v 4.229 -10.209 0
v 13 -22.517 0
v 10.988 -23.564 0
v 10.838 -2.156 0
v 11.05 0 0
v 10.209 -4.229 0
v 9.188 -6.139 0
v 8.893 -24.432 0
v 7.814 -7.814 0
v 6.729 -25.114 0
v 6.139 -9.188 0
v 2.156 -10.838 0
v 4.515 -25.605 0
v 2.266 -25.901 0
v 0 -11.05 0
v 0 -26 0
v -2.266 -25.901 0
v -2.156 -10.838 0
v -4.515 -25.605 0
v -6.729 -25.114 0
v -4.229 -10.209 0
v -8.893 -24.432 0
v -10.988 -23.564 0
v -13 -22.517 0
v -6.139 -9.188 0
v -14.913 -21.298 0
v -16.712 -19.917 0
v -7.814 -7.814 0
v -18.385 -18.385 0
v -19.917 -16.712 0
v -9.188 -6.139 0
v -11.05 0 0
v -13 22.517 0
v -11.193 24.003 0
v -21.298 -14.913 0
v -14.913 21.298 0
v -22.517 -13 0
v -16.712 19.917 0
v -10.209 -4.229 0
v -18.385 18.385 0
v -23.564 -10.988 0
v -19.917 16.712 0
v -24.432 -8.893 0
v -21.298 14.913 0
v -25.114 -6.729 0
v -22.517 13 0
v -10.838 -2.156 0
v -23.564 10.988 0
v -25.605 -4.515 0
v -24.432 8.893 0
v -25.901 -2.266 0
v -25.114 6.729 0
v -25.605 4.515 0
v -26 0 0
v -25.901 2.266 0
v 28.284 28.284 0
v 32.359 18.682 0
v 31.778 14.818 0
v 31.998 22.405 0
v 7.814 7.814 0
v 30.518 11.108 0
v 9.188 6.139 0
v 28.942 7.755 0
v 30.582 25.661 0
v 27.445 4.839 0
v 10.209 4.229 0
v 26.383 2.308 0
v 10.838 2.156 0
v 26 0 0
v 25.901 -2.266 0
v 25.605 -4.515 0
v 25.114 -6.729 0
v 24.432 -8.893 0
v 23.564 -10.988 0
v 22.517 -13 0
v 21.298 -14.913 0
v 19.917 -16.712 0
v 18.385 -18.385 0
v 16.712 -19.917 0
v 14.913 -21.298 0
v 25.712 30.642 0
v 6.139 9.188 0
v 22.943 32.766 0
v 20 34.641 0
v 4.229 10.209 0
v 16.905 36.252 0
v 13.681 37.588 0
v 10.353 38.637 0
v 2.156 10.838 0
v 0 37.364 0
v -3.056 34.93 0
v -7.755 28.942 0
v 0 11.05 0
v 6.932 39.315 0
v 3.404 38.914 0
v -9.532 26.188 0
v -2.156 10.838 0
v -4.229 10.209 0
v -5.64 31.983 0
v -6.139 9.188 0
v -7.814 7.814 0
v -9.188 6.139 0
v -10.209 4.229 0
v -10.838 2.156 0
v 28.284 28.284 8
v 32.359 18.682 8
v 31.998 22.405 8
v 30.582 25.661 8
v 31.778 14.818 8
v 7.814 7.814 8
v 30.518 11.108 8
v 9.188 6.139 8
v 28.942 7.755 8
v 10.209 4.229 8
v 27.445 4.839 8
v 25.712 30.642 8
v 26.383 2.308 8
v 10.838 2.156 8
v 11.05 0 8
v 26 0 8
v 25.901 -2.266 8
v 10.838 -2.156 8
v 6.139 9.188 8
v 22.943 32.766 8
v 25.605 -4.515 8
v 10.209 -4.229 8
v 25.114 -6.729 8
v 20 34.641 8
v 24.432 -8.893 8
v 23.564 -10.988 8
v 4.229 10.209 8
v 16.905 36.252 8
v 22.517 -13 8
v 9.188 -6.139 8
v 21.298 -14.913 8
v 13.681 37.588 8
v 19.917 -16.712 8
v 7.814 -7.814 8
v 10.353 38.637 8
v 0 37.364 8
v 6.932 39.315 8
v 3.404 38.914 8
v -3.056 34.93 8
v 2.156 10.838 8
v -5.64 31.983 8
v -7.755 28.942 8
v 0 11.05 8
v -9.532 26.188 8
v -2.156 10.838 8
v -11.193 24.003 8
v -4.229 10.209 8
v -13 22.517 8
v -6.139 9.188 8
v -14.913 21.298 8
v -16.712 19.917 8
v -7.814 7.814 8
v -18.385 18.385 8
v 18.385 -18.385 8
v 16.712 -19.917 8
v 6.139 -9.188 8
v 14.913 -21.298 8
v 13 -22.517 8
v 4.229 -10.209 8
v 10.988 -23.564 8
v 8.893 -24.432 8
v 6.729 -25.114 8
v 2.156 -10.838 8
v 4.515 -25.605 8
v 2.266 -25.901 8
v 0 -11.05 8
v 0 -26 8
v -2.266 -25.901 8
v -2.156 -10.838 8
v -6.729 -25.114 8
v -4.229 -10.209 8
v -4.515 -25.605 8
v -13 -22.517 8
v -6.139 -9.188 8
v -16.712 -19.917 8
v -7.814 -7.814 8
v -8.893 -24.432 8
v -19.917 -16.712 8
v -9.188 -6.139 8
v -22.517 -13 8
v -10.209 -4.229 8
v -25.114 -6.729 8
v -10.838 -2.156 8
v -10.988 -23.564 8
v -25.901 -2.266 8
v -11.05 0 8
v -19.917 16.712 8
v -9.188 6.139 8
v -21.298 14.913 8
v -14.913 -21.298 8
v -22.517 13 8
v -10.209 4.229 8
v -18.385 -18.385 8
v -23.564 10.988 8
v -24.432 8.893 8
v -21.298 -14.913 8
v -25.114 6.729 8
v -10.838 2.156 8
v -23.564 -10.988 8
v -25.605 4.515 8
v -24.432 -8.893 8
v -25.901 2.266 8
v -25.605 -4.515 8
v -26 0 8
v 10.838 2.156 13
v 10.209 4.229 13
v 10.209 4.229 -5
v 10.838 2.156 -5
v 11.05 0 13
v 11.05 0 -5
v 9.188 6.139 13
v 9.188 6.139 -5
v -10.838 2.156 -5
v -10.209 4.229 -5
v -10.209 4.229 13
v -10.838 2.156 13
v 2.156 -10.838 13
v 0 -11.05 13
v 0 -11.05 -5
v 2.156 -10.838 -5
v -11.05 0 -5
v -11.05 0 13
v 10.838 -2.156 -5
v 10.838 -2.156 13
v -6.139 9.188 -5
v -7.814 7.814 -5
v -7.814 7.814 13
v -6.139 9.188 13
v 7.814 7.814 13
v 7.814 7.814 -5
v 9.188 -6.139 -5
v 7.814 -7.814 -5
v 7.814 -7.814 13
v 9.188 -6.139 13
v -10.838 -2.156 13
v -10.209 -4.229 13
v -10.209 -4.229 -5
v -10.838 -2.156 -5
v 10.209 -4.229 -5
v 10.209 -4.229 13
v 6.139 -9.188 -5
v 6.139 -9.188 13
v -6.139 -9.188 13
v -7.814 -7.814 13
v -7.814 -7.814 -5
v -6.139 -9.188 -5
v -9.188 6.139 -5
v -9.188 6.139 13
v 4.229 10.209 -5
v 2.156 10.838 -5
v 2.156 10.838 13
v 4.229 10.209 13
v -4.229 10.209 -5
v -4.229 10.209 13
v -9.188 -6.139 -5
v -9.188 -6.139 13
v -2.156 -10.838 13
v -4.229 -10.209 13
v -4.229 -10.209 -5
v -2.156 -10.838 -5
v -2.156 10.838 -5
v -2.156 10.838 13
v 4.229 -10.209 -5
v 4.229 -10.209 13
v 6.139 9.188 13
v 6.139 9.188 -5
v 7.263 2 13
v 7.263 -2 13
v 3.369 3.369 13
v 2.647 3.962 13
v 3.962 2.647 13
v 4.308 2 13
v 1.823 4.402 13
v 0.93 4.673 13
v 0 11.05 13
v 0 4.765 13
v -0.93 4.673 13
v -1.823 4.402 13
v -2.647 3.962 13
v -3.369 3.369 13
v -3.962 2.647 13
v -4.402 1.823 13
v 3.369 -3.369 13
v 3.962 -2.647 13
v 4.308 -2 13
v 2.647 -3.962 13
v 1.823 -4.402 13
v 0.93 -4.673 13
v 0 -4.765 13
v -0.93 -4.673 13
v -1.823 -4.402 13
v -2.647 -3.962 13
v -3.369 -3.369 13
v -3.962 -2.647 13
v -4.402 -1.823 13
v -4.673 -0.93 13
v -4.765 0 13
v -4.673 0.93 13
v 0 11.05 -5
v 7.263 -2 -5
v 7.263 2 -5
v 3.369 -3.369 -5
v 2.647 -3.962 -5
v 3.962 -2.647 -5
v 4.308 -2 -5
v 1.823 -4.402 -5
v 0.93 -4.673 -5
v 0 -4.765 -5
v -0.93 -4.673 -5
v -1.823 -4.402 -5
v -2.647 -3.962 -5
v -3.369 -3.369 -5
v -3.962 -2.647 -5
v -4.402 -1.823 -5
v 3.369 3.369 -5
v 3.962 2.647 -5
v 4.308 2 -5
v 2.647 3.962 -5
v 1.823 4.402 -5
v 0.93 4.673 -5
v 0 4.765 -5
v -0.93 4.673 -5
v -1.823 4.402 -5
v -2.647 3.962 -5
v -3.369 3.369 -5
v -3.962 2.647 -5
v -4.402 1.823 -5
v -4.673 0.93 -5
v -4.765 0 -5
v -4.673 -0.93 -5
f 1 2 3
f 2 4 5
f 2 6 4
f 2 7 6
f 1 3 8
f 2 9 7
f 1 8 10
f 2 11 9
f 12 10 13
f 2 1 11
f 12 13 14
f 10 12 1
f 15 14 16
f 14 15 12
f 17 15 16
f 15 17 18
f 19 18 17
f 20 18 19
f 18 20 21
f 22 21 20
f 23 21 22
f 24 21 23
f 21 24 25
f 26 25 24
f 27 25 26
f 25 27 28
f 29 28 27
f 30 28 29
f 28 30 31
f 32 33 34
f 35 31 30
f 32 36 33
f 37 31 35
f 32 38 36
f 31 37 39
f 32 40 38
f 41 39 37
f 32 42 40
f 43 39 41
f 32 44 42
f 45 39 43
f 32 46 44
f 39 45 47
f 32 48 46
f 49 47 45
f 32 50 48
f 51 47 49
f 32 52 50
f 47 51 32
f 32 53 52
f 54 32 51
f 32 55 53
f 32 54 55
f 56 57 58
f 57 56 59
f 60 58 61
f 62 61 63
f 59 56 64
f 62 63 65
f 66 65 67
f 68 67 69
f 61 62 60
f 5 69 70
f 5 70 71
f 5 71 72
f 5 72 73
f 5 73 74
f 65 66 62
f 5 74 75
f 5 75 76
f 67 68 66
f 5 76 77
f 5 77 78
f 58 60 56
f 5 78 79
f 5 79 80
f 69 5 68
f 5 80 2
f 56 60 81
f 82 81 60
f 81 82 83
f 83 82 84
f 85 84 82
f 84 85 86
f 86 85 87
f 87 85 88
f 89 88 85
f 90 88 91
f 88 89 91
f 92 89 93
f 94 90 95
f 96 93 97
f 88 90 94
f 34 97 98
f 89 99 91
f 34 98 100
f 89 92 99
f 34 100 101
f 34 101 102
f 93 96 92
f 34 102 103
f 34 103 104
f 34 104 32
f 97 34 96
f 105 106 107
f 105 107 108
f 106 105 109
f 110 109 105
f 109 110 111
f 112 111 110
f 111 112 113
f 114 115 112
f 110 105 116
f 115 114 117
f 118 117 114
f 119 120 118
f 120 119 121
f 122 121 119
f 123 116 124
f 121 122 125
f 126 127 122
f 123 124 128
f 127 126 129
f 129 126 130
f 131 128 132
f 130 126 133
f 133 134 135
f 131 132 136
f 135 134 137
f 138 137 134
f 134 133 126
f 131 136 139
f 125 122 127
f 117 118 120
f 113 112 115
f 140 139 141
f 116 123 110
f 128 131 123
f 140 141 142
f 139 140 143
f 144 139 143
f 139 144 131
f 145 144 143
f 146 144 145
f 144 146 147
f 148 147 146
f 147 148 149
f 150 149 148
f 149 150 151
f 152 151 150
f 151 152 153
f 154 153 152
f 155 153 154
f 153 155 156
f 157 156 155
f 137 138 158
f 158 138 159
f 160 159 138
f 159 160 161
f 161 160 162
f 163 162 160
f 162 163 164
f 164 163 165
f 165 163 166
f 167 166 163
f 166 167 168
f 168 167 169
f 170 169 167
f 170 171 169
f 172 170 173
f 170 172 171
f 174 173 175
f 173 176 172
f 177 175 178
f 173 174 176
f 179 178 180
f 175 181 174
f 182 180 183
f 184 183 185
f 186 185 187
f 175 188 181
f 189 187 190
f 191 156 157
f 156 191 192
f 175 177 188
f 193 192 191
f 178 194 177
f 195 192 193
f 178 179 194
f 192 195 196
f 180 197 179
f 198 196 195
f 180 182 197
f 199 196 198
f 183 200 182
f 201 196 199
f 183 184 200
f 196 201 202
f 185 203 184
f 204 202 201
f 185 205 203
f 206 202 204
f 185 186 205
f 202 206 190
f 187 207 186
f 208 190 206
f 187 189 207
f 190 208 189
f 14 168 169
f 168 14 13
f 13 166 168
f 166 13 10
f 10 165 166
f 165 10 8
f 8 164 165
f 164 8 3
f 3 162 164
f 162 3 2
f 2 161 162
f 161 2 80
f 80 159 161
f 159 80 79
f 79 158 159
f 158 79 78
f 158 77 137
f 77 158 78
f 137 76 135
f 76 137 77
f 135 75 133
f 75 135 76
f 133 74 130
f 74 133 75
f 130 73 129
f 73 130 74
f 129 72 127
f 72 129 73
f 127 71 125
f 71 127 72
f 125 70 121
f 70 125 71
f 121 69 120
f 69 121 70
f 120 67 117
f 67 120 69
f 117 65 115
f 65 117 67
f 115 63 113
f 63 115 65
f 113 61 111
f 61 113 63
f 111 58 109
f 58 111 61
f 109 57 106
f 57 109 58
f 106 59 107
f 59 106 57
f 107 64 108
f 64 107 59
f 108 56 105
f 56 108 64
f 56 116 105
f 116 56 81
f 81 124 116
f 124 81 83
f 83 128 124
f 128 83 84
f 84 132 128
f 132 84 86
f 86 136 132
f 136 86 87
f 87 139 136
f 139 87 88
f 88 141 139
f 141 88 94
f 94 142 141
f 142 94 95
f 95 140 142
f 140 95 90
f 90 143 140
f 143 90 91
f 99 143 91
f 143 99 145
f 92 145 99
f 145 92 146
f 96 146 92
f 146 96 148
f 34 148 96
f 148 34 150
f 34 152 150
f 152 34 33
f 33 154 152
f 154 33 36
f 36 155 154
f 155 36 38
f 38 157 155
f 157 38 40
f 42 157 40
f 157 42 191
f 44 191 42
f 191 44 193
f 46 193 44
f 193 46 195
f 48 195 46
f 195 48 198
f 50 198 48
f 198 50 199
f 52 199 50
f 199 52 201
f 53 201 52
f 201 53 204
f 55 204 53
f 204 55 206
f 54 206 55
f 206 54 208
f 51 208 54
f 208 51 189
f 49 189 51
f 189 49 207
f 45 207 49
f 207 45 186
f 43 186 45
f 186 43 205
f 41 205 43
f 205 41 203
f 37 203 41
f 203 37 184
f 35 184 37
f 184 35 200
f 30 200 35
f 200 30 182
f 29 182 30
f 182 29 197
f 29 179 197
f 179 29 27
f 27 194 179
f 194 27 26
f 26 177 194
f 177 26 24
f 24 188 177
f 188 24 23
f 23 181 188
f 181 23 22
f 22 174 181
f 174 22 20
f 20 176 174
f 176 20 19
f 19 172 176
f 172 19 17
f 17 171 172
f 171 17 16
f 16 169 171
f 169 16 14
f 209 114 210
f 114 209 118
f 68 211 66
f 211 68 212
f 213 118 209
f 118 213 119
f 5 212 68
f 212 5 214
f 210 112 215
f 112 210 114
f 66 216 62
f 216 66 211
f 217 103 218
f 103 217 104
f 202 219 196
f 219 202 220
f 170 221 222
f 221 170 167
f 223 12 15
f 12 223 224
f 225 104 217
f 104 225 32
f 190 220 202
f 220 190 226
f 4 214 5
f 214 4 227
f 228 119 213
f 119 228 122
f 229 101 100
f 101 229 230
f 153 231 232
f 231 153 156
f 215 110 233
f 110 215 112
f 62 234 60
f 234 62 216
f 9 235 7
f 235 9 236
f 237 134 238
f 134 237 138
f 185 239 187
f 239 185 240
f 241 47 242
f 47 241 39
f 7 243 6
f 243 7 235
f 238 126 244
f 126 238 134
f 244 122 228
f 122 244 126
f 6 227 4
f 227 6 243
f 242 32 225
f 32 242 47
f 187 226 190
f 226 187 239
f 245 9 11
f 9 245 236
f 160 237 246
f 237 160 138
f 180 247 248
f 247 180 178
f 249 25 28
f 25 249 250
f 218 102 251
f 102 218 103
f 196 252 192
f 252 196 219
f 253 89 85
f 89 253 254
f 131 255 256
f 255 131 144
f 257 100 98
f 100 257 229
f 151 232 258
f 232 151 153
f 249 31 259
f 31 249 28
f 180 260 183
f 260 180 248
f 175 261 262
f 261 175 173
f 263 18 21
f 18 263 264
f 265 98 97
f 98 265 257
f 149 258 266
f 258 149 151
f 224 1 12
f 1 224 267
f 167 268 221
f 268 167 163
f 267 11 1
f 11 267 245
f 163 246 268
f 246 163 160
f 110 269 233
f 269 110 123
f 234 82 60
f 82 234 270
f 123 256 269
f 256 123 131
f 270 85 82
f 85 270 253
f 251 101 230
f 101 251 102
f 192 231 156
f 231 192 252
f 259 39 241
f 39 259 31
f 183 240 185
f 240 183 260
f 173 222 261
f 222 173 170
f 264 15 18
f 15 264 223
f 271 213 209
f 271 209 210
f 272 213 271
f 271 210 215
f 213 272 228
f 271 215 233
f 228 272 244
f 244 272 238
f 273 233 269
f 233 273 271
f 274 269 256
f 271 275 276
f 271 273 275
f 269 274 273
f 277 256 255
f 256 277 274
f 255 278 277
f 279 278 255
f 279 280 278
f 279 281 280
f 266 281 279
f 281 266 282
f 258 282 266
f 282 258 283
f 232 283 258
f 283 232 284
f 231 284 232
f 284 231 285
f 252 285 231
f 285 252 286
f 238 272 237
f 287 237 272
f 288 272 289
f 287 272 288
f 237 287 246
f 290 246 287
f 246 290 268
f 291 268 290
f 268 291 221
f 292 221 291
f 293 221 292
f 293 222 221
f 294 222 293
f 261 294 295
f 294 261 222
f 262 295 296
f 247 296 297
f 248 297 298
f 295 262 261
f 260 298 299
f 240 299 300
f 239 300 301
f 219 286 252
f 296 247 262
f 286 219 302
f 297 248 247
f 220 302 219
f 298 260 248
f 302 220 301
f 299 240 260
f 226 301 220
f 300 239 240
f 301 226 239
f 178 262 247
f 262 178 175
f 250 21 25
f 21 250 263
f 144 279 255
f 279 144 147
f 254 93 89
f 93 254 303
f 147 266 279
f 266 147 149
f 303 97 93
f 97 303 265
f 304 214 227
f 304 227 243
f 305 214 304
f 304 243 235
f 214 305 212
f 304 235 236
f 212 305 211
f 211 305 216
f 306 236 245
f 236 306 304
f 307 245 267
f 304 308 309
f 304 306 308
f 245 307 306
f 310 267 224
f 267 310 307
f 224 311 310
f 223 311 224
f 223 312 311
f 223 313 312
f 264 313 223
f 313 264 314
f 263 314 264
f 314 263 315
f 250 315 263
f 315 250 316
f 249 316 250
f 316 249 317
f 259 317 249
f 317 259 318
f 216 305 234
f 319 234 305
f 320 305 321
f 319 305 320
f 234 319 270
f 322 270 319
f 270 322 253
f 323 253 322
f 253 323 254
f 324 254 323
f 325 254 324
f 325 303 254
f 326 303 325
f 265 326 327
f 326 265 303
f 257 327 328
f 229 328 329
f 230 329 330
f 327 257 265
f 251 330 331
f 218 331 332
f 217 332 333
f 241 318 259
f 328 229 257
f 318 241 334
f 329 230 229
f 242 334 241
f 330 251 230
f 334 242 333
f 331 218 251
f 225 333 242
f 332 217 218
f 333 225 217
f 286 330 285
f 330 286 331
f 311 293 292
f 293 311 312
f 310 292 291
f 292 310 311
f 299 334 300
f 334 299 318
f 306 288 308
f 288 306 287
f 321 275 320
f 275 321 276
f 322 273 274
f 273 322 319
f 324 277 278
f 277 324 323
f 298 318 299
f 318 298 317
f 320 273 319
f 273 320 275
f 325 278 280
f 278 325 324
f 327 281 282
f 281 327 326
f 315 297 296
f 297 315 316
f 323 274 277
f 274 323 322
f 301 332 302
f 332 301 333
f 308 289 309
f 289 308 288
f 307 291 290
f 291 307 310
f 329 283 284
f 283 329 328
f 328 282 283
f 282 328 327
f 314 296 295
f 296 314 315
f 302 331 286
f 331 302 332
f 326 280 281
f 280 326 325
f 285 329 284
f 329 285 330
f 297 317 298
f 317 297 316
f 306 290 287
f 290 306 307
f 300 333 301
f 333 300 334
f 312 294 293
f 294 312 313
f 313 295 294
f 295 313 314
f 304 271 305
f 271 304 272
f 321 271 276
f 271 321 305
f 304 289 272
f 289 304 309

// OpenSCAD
$fn = 32;

// ----------------------------------------------------------------------
// Cam: base radius 26 mm with a 14 mm lift over 120 degrees
// ----------------------------------------------------------------------

// --- parameters (mm) ---
base_r = 26;              // base radius
lift = 14;                // lift height above the base radius
lift_span = 120;          // angular width of the lift
lift_start = 0;           // angle where the lift starts
cam_t = 8;                // cam plate thickness
hub_d = 22.1;             // hub diameter
hub_h = 18;               // hub height
bore_d = 9.53;            // bore
key_w = 4;                // keyway width
key_depth = 2;            // keyway depth

cam_profile = [[26, 0], [26.383, 2.308], [27.445, 4.839], [28.942, 7.755], [30.518, 11.108], [31.778, 14.818], [32.359, 18.682], [31.998, 22.405], [30.582, 25.661], [28.284, 28.284], [25.712, 30.642], [22.943, 32.766], [20, 34.641], [16.905, 36.252], [13.681, 37.588], [10.353, 38.637], [6.932, 39.315], [3.404, 38.914], [0, 37.364], [-3.056, 34.93], [-5.64, 31.983], [-7.755, 28.942], [-9.532, 26.188], [-11.193, 24.003], [-13, 22.517], [-14.913, 21.298], [-16.712, 19.917], [-18.385, 18.385], [-19.917, 16.712], [-21.298, 14.913], [-22.517, 13], [-23.564, 10.988], [-24.432, 8.893], [-25.114, 6.729], [-25.605, 4.515], [-25.901, 2.266], [-26, 0], [-25.901, -2.266], [-25.605, -4.515], [-25.114, -6.729], [-24.432, -8.893], [-23.564, -10.988], [-22.517, -13], [-21.298, -14.913], [-19.917, -16.712], [-18.385, -18.385], [-16.712, -19.917], [-14.913, -21.298], [-13, -22.517], [-10.988, -23.564], [-8.893, -24.432], [-6.729, -25.114], [-4.515, -25.605], [-2.266, -25.901], [0, -26], [2.266, -25.901], [4.515, -25.605], [6.729, -25.114], [8.893, -24.432], [10.988, -23.564], [13, -22.517], [14.913, -21.298], [16.712, -19.917], [18.385, -18.385], [19.917, -16.712], [21.298, -14.913], [22.517, -13], [23.564, -10.988], [24.432, -8.893], [25.114, -6.729], [25.605, -4.515], [25.901, -2.266]];

difference() {
  union() {
    linear_extrude(height = cam_t) polygon(cam_profile);
    /* hub, proud of the cam plate on both sides */
    translate([0, 0, -5]) cylinder(h = hub_h, d = hub_d);
  }
  /* bore through the hub, 2.5 mm clear on both faces */
  translate([0, 0, -7.5]) cylinder(h = hub_h + 5, d = bore_d);
  /* keyway, milled through the whole hub */
  translate([2.763, -2, -7.5]) cube([4.5, 4, 23]);
}
